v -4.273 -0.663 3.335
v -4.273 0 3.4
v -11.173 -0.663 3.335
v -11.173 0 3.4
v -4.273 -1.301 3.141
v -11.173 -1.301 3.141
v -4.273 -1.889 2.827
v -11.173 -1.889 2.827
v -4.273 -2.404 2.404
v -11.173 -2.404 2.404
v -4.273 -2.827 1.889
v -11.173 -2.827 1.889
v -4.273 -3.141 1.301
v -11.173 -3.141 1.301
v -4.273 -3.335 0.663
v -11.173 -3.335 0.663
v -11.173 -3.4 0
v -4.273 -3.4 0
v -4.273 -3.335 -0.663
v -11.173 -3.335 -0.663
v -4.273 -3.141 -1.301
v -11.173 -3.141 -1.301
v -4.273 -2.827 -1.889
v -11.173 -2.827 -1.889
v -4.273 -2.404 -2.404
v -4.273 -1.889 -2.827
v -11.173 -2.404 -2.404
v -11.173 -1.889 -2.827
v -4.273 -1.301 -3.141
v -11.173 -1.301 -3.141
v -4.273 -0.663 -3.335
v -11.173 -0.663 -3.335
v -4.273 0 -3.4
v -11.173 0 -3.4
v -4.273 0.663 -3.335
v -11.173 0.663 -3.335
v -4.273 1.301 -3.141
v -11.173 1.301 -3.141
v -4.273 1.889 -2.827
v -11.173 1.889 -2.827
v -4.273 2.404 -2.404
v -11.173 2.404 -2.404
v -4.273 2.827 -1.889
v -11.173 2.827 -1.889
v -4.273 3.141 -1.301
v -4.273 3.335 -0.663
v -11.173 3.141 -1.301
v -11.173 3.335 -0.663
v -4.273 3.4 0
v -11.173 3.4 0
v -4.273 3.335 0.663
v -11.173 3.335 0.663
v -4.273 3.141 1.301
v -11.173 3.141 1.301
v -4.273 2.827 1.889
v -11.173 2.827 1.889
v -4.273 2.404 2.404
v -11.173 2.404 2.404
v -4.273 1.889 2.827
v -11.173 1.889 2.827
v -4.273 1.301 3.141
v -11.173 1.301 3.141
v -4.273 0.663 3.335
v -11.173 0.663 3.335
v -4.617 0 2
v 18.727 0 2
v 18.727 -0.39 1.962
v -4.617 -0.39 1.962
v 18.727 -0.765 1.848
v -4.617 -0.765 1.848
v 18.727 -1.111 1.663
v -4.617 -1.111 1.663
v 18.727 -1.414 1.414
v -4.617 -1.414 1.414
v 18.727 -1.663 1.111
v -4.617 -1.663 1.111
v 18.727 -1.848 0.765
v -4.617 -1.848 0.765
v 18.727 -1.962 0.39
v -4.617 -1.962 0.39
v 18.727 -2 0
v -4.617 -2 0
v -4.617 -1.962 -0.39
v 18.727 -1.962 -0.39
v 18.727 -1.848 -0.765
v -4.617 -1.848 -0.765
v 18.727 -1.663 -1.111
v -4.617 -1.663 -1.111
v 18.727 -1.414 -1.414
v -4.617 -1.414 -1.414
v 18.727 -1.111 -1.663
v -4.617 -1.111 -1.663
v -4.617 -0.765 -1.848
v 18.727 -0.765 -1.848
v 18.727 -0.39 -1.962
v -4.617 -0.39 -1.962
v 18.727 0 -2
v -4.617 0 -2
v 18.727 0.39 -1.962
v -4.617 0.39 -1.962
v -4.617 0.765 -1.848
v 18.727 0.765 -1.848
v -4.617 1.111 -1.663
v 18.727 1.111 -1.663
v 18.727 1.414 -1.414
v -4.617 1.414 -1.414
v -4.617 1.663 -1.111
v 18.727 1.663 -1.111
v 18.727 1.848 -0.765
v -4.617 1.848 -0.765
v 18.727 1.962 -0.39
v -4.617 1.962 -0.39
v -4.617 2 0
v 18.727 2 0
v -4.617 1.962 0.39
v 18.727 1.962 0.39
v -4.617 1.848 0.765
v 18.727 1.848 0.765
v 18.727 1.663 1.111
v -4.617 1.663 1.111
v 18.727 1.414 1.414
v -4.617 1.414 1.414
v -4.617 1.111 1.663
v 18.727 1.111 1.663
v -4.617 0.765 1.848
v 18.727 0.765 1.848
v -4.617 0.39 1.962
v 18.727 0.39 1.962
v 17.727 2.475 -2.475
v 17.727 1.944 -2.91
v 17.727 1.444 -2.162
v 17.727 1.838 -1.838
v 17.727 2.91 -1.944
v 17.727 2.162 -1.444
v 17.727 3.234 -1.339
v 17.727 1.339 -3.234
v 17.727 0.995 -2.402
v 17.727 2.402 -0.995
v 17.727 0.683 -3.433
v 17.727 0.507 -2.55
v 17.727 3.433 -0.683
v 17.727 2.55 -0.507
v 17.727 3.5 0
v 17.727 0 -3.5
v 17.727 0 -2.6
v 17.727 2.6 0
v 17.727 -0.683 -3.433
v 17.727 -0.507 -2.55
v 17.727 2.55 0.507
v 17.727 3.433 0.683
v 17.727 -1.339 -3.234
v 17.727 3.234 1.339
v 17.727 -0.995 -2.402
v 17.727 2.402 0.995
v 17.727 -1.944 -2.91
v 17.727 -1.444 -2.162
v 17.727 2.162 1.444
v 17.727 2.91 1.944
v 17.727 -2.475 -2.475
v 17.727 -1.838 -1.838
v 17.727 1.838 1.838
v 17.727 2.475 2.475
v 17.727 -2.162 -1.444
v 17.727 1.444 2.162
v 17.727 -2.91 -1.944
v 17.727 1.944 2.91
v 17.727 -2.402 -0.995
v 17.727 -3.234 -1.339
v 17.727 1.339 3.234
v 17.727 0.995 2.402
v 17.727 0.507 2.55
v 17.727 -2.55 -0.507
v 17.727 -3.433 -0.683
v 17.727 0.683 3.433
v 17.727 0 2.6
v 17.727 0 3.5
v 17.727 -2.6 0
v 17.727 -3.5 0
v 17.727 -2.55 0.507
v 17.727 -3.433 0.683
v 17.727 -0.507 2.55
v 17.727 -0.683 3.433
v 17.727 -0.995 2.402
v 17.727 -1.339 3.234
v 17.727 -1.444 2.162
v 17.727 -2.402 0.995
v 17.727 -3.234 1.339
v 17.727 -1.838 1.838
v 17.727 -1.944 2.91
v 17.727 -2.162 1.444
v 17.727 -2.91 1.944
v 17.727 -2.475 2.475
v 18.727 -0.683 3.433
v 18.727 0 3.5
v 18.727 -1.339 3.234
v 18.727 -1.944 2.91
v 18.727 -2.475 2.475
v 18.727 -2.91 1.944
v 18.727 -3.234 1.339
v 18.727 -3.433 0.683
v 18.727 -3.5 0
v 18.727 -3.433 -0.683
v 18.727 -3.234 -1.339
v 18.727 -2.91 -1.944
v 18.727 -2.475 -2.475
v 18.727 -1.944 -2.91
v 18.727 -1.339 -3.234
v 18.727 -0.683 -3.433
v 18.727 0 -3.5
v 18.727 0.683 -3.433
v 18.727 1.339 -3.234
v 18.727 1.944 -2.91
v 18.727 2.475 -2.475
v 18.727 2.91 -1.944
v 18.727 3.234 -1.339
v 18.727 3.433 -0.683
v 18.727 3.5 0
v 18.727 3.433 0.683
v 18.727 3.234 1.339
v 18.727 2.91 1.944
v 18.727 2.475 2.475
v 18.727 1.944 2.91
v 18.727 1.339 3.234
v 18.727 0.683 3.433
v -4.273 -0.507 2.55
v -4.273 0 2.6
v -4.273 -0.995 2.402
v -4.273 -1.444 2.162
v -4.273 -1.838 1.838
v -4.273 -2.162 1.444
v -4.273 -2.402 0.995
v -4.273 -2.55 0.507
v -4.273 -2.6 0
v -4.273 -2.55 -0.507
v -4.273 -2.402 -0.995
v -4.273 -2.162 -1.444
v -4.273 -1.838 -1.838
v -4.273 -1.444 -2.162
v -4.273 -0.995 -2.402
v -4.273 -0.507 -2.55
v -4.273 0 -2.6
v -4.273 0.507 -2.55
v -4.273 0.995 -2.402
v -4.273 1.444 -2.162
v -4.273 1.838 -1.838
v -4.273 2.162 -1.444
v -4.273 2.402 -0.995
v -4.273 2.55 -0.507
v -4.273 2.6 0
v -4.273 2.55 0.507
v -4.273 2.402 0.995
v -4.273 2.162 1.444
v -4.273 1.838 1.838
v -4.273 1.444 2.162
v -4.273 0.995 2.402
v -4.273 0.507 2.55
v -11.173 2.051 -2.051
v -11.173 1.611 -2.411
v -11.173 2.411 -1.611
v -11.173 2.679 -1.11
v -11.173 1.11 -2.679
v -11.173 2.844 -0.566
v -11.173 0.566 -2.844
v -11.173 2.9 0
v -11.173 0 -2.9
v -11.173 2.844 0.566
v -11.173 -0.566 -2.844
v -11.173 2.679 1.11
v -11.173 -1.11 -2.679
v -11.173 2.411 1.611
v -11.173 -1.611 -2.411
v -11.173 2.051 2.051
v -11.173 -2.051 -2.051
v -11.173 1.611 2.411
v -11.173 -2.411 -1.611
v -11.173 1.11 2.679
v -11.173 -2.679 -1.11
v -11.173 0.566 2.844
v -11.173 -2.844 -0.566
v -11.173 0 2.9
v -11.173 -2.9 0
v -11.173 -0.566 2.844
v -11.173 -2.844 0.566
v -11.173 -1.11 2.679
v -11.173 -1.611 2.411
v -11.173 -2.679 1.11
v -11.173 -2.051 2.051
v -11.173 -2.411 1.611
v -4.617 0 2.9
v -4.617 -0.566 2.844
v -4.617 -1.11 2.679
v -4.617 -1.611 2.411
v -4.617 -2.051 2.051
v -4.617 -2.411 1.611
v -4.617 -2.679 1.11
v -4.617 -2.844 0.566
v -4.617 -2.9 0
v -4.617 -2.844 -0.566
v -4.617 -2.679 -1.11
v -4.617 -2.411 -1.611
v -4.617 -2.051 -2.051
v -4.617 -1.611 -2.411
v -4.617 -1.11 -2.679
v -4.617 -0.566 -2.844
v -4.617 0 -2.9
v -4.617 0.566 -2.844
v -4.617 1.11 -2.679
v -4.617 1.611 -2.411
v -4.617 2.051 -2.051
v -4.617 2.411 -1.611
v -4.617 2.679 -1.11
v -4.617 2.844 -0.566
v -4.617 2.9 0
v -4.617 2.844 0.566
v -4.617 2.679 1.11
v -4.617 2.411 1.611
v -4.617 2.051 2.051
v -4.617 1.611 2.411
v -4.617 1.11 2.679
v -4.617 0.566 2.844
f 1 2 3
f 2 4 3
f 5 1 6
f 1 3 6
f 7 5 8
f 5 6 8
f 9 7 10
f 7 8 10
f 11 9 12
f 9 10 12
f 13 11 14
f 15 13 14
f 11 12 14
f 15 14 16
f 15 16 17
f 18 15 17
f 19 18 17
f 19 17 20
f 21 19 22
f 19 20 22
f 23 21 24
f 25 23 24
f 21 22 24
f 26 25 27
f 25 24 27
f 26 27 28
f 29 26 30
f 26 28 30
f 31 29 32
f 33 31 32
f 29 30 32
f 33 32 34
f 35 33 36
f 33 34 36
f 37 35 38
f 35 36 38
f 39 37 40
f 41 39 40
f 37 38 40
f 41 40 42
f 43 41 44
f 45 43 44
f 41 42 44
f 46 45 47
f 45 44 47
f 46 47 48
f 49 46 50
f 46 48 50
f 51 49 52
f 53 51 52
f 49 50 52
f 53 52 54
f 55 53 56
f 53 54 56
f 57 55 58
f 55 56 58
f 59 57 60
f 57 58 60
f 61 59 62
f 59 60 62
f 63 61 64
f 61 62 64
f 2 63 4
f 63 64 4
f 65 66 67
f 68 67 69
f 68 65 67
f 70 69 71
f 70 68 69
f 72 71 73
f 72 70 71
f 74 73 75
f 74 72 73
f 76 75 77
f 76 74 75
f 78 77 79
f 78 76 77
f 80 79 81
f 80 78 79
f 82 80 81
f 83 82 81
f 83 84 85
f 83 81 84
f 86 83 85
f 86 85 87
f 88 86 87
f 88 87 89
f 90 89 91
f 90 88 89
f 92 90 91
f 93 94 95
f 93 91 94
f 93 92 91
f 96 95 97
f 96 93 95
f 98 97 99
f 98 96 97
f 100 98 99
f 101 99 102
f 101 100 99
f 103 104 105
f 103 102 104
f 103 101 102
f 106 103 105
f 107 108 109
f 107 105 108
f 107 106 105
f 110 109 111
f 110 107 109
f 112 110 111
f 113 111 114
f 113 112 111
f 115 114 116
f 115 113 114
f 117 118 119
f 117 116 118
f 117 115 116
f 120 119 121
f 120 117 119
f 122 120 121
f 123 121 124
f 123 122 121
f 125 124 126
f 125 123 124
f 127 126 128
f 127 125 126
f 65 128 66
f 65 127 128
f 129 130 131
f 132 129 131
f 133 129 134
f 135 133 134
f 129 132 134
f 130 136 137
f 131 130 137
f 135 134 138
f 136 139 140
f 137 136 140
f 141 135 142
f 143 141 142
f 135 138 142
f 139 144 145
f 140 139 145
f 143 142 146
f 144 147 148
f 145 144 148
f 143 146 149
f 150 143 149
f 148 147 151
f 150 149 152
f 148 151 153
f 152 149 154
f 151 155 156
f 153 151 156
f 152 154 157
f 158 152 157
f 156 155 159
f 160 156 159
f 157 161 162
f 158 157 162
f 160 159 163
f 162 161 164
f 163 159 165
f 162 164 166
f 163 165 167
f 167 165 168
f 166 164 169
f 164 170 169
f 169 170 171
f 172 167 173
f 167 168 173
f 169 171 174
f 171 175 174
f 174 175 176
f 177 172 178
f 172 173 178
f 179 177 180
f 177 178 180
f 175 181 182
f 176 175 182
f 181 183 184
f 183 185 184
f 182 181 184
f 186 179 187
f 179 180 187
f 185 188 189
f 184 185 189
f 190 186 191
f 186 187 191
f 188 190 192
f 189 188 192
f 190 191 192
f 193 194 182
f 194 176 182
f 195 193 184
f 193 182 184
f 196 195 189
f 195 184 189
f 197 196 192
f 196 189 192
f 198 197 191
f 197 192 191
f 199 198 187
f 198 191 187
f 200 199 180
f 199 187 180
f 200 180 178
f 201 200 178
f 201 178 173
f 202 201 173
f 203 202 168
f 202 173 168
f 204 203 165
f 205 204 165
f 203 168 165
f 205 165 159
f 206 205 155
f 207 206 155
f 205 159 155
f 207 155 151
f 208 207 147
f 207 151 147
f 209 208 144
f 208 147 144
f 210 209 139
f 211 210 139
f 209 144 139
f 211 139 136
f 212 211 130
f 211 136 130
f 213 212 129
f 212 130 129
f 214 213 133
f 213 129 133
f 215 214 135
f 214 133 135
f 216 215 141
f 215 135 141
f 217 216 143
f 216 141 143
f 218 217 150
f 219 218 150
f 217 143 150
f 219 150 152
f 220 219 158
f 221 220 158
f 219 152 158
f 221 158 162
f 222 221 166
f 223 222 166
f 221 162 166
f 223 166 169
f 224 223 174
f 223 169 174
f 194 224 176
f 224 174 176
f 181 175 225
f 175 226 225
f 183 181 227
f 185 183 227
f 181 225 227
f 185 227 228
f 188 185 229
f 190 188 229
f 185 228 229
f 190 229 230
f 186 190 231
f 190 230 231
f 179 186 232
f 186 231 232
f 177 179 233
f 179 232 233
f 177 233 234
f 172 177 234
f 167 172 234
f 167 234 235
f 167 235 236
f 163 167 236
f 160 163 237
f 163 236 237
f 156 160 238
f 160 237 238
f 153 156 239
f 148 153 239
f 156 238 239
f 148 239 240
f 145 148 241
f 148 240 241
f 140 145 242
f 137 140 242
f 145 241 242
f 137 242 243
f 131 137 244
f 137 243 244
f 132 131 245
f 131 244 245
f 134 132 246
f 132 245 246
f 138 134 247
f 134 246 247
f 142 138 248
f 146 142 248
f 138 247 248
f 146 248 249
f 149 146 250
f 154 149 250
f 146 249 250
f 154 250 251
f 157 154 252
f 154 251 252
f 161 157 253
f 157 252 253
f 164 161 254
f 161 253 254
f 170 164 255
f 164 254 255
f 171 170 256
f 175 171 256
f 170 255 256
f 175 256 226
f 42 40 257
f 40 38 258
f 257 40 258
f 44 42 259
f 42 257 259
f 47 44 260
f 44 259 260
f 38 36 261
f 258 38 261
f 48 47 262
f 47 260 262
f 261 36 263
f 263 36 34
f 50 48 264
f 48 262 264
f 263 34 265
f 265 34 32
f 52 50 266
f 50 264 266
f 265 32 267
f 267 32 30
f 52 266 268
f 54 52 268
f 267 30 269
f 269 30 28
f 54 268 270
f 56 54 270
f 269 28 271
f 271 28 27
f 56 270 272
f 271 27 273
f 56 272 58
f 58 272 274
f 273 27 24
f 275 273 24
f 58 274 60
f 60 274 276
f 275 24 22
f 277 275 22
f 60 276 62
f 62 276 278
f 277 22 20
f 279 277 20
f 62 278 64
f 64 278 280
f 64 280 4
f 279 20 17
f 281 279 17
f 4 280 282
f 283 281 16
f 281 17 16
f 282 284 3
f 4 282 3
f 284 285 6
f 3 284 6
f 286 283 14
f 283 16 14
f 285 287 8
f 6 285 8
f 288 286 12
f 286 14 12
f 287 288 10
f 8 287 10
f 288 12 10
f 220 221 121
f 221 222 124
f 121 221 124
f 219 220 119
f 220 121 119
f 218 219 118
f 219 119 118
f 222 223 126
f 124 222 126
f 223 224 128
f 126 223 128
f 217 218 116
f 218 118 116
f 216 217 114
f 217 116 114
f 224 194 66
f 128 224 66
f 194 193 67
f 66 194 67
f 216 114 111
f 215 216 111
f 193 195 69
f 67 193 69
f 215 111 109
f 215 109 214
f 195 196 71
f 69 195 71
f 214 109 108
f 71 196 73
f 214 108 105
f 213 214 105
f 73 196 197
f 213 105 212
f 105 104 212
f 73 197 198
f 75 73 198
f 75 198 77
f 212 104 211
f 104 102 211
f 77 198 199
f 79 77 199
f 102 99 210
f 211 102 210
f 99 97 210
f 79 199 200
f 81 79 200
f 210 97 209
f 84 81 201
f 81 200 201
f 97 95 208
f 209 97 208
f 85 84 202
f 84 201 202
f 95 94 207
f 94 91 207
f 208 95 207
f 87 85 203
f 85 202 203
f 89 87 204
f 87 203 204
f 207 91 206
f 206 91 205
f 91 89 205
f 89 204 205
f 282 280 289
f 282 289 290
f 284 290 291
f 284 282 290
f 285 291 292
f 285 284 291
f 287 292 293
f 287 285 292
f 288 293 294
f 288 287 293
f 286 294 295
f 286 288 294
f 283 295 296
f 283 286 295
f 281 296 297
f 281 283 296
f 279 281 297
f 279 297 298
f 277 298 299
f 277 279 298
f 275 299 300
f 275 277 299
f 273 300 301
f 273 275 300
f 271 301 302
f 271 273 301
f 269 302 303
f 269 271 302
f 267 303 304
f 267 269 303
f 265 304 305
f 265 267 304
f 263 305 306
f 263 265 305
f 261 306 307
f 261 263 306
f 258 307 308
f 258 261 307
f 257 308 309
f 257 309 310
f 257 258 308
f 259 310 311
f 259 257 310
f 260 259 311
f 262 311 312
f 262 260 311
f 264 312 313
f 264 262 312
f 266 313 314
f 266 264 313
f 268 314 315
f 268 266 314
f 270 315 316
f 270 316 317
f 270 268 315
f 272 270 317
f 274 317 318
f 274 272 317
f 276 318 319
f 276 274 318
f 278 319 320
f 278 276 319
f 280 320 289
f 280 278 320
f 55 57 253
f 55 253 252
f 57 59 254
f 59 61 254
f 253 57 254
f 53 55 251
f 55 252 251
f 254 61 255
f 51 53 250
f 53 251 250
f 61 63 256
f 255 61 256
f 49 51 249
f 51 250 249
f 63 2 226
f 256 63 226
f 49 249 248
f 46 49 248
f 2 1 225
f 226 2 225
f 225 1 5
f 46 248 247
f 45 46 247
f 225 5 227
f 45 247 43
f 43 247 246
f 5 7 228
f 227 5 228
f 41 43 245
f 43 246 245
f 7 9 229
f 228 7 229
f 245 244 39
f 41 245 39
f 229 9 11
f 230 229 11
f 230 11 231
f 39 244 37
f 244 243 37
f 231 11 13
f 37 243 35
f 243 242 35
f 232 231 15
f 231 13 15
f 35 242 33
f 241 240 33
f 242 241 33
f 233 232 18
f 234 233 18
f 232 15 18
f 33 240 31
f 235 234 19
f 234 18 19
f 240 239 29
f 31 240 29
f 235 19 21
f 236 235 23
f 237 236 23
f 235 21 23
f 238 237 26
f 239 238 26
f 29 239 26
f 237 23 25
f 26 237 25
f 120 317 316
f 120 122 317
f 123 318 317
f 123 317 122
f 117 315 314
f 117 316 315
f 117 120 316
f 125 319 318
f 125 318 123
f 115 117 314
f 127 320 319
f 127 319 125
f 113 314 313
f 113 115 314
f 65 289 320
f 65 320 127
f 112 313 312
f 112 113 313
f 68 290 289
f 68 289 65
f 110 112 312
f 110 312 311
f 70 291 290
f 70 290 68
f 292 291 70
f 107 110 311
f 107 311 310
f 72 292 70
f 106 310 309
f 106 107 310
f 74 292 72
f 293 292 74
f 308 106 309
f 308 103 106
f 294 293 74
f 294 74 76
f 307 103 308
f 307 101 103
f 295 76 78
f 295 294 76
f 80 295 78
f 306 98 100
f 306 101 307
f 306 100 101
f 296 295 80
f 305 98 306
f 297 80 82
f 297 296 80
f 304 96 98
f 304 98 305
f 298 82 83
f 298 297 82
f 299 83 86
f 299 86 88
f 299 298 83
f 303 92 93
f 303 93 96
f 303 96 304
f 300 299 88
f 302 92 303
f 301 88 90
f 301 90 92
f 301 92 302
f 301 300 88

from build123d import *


with BuildPart() as f1:
    # F0 (on Front) → F1 (revolve)
    with BuildSketch(Plane.XZ):
        Polygon((-11.17308, 3.4), (-11.17308, 0), (17.72692, 0), (17.72692, 2.6), (-4.27308, 2.6), (-4.27308, 3.4), align=None)
        Polygon((17.72692, 2.6), (17.72692, 0), (18.72692, 0), (18.72692, 3.5), (17.72692, 3.5), align=None)
    revolve(axis=Axis((2.68319, 0, 0), (1, 0, 0)))

    # F2 (on Front) → F3 (revolve, cut)
    with BuildSketch(Plane.XZ):
        Polygon((-12.316774, 2.9), (-12.316774, 0), (20.493909, 0), (20.493909, 2), (-4.616774, 2), (-4.616774, 2.9), align=None)
    revolve(axis=Axis((3.41996, 0, 0), (1, 0, 0)), mode=Mode.SUBTRACT)


solid = f1.part
